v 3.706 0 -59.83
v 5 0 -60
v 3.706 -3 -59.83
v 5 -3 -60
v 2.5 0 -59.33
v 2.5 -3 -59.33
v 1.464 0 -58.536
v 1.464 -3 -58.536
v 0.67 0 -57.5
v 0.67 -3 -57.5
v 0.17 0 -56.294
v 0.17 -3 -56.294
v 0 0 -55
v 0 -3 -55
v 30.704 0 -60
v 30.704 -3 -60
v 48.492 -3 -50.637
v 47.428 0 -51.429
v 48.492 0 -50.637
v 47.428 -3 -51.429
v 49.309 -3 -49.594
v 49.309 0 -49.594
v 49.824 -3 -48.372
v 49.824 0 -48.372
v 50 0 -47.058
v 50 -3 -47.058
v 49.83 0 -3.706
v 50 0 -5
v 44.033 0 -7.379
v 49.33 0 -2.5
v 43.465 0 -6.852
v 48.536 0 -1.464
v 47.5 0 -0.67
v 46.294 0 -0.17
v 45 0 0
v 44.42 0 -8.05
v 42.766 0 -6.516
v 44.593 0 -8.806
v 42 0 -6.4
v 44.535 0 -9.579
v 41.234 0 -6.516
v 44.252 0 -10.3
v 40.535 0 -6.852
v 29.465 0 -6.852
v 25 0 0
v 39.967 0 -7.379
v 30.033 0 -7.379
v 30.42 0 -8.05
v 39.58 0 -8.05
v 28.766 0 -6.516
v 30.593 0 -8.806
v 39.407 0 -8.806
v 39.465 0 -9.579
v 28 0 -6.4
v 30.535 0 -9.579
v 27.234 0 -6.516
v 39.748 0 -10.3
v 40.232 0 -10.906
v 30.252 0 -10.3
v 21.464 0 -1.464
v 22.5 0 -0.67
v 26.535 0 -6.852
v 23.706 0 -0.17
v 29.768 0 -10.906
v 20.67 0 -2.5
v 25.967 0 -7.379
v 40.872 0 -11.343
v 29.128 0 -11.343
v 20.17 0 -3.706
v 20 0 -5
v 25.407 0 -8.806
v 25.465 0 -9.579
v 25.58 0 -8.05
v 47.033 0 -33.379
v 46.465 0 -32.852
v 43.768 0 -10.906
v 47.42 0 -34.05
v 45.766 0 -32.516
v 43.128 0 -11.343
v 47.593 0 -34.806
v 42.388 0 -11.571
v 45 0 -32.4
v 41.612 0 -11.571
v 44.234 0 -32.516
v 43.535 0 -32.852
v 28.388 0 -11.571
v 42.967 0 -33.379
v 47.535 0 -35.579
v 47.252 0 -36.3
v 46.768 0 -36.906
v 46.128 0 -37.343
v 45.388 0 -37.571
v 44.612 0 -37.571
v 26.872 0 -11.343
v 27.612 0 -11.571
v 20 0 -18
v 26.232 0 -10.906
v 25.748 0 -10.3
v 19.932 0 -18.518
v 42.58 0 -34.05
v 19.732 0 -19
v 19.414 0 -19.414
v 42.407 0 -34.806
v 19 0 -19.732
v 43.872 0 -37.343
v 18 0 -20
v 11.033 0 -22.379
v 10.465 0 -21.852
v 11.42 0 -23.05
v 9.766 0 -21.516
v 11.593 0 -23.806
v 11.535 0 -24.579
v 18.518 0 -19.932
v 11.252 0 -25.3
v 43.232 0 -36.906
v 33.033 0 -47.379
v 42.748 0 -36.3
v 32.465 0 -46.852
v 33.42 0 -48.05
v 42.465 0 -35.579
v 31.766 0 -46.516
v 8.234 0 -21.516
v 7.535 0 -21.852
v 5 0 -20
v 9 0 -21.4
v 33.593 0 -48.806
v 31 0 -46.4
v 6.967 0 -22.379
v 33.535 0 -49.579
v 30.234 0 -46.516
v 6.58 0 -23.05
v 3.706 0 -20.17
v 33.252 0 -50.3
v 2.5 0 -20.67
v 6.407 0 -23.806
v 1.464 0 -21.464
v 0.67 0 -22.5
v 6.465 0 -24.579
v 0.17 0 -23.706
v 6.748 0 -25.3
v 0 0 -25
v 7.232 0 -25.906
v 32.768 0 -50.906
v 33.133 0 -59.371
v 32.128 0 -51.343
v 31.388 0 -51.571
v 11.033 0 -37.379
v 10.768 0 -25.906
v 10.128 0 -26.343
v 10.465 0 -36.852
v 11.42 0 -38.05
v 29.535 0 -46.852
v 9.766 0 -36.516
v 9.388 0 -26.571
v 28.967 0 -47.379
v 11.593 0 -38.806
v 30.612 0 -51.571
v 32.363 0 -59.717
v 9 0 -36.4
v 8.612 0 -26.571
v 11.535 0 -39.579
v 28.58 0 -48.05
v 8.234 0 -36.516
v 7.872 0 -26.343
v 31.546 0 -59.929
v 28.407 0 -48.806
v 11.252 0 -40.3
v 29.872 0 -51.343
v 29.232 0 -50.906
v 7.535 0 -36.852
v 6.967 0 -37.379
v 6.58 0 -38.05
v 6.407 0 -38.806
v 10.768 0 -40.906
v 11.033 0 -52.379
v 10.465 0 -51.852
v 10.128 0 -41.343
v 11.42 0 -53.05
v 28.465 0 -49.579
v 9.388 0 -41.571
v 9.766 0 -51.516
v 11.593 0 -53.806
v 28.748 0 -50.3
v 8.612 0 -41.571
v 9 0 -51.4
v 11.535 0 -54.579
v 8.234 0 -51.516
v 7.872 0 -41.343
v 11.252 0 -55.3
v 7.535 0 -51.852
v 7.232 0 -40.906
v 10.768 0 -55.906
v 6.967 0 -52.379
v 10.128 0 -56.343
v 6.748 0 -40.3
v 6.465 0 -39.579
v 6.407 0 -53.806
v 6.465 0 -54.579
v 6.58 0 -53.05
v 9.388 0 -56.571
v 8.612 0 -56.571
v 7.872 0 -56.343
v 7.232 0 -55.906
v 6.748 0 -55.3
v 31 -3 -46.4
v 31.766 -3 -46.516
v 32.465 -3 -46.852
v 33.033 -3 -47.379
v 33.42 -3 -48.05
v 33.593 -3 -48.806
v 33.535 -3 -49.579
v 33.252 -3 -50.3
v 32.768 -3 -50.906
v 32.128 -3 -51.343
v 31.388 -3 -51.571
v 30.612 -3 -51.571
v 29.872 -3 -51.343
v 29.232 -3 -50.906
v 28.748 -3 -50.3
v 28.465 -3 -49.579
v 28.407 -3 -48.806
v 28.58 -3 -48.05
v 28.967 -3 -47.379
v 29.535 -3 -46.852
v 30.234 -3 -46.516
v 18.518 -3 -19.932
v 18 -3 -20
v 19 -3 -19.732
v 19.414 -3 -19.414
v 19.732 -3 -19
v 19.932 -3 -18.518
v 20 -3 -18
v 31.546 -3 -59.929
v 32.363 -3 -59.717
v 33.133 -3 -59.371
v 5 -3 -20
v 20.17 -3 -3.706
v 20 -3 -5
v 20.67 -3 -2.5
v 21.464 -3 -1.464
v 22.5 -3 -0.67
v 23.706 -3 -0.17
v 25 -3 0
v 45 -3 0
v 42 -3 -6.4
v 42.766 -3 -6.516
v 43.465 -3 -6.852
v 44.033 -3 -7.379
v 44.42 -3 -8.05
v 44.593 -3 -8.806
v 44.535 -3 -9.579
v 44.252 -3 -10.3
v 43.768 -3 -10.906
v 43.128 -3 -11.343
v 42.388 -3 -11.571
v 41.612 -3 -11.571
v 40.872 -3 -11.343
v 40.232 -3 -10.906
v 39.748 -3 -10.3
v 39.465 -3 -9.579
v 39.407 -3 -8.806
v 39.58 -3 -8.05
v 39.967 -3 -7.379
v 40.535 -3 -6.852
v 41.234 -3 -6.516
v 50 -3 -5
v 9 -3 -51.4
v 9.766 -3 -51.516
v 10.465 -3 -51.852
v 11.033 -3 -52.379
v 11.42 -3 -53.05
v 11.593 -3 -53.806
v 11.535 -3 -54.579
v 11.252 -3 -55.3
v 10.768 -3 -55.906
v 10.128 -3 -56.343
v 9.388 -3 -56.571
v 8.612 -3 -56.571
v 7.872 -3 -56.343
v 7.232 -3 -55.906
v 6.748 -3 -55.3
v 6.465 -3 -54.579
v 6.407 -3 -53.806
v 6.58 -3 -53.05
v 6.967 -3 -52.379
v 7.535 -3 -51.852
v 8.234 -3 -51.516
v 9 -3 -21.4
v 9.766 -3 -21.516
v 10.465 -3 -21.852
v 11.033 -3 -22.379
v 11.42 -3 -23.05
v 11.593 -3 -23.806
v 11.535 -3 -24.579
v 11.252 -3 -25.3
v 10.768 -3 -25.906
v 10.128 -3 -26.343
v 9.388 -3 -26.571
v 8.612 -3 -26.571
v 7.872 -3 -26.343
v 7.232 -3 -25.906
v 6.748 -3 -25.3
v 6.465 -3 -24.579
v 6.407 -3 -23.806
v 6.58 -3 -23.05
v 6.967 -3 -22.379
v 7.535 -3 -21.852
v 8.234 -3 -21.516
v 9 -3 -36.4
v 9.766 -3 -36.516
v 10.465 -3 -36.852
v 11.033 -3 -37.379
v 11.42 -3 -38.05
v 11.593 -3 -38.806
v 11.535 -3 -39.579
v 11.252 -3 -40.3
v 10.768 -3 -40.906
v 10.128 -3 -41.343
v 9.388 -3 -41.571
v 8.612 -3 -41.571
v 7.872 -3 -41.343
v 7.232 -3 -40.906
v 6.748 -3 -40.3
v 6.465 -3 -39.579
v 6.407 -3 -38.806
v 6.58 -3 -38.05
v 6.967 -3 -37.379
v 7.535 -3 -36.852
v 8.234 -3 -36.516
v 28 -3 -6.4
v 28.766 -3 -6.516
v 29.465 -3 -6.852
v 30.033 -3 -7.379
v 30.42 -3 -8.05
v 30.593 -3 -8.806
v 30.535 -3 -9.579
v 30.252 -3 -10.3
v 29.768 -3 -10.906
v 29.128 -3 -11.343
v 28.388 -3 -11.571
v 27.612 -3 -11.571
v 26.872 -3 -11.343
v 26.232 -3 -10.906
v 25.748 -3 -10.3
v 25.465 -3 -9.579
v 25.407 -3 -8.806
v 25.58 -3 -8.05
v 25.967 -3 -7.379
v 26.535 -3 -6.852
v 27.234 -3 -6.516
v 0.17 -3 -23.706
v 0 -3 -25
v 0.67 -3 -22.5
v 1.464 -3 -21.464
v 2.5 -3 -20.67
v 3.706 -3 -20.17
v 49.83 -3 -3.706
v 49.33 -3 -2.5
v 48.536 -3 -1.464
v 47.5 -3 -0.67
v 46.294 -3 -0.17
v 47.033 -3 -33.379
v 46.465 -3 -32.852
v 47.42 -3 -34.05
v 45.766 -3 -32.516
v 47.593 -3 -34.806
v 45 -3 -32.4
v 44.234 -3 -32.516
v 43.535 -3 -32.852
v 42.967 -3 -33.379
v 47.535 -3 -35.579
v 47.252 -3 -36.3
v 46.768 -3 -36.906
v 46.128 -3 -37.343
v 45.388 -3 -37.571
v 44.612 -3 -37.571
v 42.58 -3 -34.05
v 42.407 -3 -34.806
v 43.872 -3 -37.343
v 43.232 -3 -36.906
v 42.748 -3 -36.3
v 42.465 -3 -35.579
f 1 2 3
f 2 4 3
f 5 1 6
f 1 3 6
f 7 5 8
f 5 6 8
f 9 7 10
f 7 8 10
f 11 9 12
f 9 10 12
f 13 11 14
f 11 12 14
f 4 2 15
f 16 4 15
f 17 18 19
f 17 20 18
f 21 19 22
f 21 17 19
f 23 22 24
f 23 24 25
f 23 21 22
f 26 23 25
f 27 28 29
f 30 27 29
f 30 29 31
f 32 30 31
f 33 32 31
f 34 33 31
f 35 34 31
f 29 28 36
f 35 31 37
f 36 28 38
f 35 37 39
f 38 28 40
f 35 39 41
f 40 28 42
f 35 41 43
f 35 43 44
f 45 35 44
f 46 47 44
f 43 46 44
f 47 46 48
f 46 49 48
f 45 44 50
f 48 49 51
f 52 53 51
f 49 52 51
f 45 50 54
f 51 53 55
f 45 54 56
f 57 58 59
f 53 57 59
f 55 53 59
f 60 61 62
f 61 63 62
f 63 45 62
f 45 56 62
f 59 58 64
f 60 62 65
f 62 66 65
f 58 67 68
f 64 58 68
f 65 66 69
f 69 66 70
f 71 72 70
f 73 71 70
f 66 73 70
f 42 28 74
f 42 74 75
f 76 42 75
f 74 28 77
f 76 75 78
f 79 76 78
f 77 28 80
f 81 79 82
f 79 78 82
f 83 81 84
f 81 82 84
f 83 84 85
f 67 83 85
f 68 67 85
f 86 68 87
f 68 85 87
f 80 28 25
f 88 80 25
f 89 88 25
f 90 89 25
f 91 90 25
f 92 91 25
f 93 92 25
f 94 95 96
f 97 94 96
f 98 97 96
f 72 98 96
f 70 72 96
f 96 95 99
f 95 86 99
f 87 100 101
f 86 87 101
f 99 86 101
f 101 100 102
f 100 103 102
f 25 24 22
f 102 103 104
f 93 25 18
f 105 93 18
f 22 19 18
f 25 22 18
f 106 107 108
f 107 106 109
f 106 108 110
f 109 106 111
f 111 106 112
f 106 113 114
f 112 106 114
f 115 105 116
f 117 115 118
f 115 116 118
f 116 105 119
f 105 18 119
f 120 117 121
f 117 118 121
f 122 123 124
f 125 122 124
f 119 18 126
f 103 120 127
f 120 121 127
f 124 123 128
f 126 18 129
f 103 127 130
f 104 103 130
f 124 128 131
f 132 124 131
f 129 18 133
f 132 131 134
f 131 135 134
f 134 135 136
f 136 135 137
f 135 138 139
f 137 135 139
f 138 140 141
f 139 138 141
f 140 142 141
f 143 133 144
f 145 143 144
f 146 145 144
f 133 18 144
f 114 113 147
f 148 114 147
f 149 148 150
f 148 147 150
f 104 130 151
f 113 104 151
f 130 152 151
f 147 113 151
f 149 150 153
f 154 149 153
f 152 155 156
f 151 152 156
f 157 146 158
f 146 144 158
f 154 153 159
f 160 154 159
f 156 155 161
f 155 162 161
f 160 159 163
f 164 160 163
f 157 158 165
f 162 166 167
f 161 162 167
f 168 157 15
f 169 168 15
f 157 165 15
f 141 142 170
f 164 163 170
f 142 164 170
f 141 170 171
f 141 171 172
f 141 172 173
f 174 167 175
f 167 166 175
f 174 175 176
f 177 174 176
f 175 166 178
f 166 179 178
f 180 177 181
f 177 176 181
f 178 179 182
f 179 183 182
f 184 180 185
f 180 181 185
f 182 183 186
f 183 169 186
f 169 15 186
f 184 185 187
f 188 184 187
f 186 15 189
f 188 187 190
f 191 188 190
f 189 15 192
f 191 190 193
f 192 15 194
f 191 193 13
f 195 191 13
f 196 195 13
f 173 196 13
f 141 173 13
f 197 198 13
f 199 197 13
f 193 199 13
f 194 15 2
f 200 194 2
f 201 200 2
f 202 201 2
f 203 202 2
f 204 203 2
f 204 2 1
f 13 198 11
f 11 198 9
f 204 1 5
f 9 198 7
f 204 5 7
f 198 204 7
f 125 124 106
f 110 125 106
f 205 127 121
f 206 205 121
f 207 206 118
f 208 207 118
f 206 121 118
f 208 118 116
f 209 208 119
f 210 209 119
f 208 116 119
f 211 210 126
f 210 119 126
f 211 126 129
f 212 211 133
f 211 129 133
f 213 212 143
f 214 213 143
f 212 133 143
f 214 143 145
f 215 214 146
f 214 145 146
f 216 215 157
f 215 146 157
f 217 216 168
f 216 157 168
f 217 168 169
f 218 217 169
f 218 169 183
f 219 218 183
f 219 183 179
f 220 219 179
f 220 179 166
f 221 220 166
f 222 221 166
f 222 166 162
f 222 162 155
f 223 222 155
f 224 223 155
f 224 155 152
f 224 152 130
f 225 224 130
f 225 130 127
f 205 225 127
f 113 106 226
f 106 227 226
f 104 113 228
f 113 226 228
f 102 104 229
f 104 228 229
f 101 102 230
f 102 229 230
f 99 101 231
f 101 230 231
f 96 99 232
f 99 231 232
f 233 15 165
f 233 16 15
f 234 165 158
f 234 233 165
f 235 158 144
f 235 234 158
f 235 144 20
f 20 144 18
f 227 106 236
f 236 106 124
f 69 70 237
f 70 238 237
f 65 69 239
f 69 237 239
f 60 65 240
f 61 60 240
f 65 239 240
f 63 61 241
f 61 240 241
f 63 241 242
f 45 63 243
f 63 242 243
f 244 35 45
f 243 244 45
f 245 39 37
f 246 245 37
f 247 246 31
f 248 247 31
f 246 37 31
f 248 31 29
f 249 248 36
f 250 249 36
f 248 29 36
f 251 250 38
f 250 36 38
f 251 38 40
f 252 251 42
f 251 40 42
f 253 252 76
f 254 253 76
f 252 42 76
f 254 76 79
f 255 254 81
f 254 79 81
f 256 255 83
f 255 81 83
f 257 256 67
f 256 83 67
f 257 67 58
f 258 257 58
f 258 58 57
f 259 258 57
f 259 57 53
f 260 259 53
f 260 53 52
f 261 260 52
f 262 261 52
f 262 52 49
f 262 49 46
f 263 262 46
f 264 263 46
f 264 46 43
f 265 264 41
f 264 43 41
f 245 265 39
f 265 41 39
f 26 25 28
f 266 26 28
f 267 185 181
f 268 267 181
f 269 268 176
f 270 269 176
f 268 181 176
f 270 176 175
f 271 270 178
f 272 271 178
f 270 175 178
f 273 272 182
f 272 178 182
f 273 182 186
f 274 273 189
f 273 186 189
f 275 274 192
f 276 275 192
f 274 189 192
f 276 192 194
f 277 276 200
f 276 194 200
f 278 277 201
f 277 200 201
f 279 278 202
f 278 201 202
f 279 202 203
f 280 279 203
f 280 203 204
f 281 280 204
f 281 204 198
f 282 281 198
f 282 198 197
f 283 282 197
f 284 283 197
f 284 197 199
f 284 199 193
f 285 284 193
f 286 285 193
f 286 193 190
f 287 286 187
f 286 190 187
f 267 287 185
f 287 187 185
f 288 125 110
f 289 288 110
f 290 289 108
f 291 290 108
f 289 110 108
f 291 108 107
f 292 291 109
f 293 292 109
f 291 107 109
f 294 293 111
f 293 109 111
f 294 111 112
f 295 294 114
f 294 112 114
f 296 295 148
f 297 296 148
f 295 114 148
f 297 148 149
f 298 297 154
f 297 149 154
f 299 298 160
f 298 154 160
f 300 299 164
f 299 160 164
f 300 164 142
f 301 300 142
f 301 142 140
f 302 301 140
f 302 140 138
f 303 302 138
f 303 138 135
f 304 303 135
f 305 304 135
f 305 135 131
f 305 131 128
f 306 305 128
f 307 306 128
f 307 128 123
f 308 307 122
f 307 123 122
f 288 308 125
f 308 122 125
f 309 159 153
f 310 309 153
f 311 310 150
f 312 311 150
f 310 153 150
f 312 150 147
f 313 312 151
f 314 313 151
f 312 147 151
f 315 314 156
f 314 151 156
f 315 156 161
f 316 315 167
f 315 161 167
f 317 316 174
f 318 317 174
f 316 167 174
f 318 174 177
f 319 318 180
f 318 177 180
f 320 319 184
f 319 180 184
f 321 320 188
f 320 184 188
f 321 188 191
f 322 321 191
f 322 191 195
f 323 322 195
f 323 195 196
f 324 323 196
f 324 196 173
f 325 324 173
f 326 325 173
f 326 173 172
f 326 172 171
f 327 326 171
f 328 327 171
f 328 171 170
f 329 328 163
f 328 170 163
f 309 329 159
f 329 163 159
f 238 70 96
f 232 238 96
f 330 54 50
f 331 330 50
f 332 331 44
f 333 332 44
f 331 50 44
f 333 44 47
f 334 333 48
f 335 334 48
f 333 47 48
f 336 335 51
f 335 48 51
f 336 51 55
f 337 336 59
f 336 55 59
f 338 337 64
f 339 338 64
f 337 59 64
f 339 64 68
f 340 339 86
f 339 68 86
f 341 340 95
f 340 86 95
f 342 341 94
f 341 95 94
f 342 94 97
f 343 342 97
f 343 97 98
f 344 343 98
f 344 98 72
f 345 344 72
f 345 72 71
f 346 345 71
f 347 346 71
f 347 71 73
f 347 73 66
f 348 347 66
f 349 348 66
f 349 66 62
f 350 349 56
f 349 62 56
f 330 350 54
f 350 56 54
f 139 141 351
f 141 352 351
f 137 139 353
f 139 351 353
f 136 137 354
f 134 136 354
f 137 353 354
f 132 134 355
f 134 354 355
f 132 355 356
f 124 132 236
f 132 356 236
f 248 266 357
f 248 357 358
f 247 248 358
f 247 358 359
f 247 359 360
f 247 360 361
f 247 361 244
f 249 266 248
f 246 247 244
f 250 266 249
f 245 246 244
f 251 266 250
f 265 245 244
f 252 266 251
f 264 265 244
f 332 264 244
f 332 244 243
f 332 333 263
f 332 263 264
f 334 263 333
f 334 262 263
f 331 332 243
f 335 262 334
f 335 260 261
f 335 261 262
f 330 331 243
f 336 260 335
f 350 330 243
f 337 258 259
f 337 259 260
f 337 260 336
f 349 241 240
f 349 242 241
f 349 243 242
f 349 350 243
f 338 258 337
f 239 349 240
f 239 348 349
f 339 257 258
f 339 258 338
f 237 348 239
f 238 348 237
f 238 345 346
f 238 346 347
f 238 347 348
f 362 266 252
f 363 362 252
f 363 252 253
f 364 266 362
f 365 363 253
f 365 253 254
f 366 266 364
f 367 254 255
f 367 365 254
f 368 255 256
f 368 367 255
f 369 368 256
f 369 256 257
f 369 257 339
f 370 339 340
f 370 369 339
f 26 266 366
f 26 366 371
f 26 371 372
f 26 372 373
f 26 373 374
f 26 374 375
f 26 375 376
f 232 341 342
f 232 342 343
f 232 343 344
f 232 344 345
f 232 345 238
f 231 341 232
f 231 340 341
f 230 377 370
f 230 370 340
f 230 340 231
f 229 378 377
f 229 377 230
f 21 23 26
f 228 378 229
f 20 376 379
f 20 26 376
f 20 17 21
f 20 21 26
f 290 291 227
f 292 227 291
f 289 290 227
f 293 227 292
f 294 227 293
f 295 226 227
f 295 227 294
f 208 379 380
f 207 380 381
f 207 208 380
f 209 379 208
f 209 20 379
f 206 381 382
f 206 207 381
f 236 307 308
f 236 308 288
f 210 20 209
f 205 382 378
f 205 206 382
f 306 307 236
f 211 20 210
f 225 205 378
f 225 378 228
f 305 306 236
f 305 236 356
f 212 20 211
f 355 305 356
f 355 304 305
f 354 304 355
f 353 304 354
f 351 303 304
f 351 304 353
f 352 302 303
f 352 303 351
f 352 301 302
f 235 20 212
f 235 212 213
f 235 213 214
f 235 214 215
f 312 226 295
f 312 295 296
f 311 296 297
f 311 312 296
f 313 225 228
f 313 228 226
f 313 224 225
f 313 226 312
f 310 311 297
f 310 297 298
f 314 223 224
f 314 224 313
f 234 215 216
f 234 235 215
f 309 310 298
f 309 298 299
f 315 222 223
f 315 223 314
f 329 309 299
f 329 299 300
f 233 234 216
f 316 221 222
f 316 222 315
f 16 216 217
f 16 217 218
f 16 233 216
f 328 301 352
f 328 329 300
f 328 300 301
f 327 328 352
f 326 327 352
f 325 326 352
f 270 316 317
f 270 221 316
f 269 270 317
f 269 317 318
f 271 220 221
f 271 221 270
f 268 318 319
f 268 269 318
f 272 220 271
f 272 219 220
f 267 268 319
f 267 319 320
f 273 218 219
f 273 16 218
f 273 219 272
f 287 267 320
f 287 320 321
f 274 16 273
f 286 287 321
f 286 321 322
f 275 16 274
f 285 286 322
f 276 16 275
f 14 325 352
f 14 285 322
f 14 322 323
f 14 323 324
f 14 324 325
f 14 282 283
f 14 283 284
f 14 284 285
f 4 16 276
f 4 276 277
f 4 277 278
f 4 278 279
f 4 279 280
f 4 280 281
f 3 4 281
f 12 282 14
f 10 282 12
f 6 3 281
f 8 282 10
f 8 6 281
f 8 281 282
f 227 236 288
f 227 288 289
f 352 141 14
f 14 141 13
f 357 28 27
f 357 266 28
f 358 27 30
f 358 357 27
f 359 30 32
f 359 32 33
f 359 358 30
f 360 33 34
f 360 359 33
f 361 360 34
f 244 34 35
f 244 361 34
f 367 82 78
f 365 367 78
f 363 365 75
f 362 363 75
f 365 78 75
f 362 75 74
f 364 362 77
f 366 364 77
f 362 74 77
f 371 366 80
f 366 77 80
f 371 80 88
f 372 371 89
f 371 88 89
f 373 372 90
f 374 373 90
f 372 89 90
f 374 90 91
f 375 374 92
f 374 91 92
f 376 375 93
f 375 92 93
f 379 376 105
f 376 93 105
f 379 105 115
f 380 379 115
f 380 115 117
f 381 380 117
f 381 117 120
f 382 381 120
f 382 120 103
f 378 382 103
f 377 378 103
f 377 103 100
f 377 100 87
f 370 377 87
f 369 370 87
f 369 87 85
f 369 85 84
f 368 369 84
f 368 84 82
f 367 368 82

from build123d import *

# Parameters (mm, degrees)
SKETCH2_R          = 2.6
BASE_FLANGE1_DEPTH = 3
FILLET1_R          = 5
SKETCH3_R          = 2.6
CUT_EXTRUDE1_DEPTH = 10
FILLET2_R          = 2


# Sheet-metal steps are written as plain solids
with BuildPart() as part:
    # Sketch2 → Base-Flange1 (new body)
    with BuildSketch(Plane(origin=(0, 0, 0), x_dir=(1, 0, 0), z_dir=(0, 1, 0))):
        Polygon((0, 60), (32, 60), (50, 50), (50, 0), (20, 0), (20, 20), (0, 20), align=None)
        with Locations(Location((9, 39, 0), (0, 0, 270))):
            Circle(SKETCH2_R, mode=Mode.SUBTRACT)
        with Locations(Location((9, 24, 0), (0, 0, 270))):
            Circle(SKETCH2_R, mode=Mode.SUBTRACT)
        with Locations(Location((28, 9, 0), (0, 0, 270))):
            Circle(SKETCH2_R, mode=Mode.SUBTRACT)
        with Locations(Location((42, 9, 0), (0, 0, 270))):
            Circle(SKETCH2_R, mode=Mode.SUBTRACT)
        with Locations(Location((9, 54, 0), (0, 0, 270))):
            Circle(SKETCH2_R, mode=Mode.SUBTRACT)
    extrude(amount=-BASE_FLANGE1_DEPTH)

    # Fillet1
    fillet1_edges = [part.edges().sort_by_distance(p)[0] for p in [
        (0, -1.5, -20),
        (0, -1.5, -60),
        (32, -1.5, -60),
        (50, -1.5, -50),
        (50, -1.5, 0),
        (20, -1.5, 0),
    ]]
    fillet(fillet1_edges, radius=FILLET1_R)

    # Sketch3 → Cut-Extrude1 (cut)
    with BuildSketch(Plane(origin=(0, 0, 0), x_dir=(1, 0, 0), z_dir=(0, 1, 0))):
        with Locations(Location((45, 35, 0), (0, 0, 270))):
            Circle(SKETCH3_R)
        with Locations(Location((31, 49, 0), (0, 0, 270))):
            Circle(SKETCH3_R)
    extrude(amount=-CUT_EXTRUDE1_DEPTH, mode=Mode.SUBTRACT)

    # Fillet2
    fillet2_edges = [part.edges().sort_by_distance(p)[0] for p in [
        (20, -1.5, -20),
    ]]
    fillet(fillet2_edges, radius=FILLET2_R)


solid = part.part
